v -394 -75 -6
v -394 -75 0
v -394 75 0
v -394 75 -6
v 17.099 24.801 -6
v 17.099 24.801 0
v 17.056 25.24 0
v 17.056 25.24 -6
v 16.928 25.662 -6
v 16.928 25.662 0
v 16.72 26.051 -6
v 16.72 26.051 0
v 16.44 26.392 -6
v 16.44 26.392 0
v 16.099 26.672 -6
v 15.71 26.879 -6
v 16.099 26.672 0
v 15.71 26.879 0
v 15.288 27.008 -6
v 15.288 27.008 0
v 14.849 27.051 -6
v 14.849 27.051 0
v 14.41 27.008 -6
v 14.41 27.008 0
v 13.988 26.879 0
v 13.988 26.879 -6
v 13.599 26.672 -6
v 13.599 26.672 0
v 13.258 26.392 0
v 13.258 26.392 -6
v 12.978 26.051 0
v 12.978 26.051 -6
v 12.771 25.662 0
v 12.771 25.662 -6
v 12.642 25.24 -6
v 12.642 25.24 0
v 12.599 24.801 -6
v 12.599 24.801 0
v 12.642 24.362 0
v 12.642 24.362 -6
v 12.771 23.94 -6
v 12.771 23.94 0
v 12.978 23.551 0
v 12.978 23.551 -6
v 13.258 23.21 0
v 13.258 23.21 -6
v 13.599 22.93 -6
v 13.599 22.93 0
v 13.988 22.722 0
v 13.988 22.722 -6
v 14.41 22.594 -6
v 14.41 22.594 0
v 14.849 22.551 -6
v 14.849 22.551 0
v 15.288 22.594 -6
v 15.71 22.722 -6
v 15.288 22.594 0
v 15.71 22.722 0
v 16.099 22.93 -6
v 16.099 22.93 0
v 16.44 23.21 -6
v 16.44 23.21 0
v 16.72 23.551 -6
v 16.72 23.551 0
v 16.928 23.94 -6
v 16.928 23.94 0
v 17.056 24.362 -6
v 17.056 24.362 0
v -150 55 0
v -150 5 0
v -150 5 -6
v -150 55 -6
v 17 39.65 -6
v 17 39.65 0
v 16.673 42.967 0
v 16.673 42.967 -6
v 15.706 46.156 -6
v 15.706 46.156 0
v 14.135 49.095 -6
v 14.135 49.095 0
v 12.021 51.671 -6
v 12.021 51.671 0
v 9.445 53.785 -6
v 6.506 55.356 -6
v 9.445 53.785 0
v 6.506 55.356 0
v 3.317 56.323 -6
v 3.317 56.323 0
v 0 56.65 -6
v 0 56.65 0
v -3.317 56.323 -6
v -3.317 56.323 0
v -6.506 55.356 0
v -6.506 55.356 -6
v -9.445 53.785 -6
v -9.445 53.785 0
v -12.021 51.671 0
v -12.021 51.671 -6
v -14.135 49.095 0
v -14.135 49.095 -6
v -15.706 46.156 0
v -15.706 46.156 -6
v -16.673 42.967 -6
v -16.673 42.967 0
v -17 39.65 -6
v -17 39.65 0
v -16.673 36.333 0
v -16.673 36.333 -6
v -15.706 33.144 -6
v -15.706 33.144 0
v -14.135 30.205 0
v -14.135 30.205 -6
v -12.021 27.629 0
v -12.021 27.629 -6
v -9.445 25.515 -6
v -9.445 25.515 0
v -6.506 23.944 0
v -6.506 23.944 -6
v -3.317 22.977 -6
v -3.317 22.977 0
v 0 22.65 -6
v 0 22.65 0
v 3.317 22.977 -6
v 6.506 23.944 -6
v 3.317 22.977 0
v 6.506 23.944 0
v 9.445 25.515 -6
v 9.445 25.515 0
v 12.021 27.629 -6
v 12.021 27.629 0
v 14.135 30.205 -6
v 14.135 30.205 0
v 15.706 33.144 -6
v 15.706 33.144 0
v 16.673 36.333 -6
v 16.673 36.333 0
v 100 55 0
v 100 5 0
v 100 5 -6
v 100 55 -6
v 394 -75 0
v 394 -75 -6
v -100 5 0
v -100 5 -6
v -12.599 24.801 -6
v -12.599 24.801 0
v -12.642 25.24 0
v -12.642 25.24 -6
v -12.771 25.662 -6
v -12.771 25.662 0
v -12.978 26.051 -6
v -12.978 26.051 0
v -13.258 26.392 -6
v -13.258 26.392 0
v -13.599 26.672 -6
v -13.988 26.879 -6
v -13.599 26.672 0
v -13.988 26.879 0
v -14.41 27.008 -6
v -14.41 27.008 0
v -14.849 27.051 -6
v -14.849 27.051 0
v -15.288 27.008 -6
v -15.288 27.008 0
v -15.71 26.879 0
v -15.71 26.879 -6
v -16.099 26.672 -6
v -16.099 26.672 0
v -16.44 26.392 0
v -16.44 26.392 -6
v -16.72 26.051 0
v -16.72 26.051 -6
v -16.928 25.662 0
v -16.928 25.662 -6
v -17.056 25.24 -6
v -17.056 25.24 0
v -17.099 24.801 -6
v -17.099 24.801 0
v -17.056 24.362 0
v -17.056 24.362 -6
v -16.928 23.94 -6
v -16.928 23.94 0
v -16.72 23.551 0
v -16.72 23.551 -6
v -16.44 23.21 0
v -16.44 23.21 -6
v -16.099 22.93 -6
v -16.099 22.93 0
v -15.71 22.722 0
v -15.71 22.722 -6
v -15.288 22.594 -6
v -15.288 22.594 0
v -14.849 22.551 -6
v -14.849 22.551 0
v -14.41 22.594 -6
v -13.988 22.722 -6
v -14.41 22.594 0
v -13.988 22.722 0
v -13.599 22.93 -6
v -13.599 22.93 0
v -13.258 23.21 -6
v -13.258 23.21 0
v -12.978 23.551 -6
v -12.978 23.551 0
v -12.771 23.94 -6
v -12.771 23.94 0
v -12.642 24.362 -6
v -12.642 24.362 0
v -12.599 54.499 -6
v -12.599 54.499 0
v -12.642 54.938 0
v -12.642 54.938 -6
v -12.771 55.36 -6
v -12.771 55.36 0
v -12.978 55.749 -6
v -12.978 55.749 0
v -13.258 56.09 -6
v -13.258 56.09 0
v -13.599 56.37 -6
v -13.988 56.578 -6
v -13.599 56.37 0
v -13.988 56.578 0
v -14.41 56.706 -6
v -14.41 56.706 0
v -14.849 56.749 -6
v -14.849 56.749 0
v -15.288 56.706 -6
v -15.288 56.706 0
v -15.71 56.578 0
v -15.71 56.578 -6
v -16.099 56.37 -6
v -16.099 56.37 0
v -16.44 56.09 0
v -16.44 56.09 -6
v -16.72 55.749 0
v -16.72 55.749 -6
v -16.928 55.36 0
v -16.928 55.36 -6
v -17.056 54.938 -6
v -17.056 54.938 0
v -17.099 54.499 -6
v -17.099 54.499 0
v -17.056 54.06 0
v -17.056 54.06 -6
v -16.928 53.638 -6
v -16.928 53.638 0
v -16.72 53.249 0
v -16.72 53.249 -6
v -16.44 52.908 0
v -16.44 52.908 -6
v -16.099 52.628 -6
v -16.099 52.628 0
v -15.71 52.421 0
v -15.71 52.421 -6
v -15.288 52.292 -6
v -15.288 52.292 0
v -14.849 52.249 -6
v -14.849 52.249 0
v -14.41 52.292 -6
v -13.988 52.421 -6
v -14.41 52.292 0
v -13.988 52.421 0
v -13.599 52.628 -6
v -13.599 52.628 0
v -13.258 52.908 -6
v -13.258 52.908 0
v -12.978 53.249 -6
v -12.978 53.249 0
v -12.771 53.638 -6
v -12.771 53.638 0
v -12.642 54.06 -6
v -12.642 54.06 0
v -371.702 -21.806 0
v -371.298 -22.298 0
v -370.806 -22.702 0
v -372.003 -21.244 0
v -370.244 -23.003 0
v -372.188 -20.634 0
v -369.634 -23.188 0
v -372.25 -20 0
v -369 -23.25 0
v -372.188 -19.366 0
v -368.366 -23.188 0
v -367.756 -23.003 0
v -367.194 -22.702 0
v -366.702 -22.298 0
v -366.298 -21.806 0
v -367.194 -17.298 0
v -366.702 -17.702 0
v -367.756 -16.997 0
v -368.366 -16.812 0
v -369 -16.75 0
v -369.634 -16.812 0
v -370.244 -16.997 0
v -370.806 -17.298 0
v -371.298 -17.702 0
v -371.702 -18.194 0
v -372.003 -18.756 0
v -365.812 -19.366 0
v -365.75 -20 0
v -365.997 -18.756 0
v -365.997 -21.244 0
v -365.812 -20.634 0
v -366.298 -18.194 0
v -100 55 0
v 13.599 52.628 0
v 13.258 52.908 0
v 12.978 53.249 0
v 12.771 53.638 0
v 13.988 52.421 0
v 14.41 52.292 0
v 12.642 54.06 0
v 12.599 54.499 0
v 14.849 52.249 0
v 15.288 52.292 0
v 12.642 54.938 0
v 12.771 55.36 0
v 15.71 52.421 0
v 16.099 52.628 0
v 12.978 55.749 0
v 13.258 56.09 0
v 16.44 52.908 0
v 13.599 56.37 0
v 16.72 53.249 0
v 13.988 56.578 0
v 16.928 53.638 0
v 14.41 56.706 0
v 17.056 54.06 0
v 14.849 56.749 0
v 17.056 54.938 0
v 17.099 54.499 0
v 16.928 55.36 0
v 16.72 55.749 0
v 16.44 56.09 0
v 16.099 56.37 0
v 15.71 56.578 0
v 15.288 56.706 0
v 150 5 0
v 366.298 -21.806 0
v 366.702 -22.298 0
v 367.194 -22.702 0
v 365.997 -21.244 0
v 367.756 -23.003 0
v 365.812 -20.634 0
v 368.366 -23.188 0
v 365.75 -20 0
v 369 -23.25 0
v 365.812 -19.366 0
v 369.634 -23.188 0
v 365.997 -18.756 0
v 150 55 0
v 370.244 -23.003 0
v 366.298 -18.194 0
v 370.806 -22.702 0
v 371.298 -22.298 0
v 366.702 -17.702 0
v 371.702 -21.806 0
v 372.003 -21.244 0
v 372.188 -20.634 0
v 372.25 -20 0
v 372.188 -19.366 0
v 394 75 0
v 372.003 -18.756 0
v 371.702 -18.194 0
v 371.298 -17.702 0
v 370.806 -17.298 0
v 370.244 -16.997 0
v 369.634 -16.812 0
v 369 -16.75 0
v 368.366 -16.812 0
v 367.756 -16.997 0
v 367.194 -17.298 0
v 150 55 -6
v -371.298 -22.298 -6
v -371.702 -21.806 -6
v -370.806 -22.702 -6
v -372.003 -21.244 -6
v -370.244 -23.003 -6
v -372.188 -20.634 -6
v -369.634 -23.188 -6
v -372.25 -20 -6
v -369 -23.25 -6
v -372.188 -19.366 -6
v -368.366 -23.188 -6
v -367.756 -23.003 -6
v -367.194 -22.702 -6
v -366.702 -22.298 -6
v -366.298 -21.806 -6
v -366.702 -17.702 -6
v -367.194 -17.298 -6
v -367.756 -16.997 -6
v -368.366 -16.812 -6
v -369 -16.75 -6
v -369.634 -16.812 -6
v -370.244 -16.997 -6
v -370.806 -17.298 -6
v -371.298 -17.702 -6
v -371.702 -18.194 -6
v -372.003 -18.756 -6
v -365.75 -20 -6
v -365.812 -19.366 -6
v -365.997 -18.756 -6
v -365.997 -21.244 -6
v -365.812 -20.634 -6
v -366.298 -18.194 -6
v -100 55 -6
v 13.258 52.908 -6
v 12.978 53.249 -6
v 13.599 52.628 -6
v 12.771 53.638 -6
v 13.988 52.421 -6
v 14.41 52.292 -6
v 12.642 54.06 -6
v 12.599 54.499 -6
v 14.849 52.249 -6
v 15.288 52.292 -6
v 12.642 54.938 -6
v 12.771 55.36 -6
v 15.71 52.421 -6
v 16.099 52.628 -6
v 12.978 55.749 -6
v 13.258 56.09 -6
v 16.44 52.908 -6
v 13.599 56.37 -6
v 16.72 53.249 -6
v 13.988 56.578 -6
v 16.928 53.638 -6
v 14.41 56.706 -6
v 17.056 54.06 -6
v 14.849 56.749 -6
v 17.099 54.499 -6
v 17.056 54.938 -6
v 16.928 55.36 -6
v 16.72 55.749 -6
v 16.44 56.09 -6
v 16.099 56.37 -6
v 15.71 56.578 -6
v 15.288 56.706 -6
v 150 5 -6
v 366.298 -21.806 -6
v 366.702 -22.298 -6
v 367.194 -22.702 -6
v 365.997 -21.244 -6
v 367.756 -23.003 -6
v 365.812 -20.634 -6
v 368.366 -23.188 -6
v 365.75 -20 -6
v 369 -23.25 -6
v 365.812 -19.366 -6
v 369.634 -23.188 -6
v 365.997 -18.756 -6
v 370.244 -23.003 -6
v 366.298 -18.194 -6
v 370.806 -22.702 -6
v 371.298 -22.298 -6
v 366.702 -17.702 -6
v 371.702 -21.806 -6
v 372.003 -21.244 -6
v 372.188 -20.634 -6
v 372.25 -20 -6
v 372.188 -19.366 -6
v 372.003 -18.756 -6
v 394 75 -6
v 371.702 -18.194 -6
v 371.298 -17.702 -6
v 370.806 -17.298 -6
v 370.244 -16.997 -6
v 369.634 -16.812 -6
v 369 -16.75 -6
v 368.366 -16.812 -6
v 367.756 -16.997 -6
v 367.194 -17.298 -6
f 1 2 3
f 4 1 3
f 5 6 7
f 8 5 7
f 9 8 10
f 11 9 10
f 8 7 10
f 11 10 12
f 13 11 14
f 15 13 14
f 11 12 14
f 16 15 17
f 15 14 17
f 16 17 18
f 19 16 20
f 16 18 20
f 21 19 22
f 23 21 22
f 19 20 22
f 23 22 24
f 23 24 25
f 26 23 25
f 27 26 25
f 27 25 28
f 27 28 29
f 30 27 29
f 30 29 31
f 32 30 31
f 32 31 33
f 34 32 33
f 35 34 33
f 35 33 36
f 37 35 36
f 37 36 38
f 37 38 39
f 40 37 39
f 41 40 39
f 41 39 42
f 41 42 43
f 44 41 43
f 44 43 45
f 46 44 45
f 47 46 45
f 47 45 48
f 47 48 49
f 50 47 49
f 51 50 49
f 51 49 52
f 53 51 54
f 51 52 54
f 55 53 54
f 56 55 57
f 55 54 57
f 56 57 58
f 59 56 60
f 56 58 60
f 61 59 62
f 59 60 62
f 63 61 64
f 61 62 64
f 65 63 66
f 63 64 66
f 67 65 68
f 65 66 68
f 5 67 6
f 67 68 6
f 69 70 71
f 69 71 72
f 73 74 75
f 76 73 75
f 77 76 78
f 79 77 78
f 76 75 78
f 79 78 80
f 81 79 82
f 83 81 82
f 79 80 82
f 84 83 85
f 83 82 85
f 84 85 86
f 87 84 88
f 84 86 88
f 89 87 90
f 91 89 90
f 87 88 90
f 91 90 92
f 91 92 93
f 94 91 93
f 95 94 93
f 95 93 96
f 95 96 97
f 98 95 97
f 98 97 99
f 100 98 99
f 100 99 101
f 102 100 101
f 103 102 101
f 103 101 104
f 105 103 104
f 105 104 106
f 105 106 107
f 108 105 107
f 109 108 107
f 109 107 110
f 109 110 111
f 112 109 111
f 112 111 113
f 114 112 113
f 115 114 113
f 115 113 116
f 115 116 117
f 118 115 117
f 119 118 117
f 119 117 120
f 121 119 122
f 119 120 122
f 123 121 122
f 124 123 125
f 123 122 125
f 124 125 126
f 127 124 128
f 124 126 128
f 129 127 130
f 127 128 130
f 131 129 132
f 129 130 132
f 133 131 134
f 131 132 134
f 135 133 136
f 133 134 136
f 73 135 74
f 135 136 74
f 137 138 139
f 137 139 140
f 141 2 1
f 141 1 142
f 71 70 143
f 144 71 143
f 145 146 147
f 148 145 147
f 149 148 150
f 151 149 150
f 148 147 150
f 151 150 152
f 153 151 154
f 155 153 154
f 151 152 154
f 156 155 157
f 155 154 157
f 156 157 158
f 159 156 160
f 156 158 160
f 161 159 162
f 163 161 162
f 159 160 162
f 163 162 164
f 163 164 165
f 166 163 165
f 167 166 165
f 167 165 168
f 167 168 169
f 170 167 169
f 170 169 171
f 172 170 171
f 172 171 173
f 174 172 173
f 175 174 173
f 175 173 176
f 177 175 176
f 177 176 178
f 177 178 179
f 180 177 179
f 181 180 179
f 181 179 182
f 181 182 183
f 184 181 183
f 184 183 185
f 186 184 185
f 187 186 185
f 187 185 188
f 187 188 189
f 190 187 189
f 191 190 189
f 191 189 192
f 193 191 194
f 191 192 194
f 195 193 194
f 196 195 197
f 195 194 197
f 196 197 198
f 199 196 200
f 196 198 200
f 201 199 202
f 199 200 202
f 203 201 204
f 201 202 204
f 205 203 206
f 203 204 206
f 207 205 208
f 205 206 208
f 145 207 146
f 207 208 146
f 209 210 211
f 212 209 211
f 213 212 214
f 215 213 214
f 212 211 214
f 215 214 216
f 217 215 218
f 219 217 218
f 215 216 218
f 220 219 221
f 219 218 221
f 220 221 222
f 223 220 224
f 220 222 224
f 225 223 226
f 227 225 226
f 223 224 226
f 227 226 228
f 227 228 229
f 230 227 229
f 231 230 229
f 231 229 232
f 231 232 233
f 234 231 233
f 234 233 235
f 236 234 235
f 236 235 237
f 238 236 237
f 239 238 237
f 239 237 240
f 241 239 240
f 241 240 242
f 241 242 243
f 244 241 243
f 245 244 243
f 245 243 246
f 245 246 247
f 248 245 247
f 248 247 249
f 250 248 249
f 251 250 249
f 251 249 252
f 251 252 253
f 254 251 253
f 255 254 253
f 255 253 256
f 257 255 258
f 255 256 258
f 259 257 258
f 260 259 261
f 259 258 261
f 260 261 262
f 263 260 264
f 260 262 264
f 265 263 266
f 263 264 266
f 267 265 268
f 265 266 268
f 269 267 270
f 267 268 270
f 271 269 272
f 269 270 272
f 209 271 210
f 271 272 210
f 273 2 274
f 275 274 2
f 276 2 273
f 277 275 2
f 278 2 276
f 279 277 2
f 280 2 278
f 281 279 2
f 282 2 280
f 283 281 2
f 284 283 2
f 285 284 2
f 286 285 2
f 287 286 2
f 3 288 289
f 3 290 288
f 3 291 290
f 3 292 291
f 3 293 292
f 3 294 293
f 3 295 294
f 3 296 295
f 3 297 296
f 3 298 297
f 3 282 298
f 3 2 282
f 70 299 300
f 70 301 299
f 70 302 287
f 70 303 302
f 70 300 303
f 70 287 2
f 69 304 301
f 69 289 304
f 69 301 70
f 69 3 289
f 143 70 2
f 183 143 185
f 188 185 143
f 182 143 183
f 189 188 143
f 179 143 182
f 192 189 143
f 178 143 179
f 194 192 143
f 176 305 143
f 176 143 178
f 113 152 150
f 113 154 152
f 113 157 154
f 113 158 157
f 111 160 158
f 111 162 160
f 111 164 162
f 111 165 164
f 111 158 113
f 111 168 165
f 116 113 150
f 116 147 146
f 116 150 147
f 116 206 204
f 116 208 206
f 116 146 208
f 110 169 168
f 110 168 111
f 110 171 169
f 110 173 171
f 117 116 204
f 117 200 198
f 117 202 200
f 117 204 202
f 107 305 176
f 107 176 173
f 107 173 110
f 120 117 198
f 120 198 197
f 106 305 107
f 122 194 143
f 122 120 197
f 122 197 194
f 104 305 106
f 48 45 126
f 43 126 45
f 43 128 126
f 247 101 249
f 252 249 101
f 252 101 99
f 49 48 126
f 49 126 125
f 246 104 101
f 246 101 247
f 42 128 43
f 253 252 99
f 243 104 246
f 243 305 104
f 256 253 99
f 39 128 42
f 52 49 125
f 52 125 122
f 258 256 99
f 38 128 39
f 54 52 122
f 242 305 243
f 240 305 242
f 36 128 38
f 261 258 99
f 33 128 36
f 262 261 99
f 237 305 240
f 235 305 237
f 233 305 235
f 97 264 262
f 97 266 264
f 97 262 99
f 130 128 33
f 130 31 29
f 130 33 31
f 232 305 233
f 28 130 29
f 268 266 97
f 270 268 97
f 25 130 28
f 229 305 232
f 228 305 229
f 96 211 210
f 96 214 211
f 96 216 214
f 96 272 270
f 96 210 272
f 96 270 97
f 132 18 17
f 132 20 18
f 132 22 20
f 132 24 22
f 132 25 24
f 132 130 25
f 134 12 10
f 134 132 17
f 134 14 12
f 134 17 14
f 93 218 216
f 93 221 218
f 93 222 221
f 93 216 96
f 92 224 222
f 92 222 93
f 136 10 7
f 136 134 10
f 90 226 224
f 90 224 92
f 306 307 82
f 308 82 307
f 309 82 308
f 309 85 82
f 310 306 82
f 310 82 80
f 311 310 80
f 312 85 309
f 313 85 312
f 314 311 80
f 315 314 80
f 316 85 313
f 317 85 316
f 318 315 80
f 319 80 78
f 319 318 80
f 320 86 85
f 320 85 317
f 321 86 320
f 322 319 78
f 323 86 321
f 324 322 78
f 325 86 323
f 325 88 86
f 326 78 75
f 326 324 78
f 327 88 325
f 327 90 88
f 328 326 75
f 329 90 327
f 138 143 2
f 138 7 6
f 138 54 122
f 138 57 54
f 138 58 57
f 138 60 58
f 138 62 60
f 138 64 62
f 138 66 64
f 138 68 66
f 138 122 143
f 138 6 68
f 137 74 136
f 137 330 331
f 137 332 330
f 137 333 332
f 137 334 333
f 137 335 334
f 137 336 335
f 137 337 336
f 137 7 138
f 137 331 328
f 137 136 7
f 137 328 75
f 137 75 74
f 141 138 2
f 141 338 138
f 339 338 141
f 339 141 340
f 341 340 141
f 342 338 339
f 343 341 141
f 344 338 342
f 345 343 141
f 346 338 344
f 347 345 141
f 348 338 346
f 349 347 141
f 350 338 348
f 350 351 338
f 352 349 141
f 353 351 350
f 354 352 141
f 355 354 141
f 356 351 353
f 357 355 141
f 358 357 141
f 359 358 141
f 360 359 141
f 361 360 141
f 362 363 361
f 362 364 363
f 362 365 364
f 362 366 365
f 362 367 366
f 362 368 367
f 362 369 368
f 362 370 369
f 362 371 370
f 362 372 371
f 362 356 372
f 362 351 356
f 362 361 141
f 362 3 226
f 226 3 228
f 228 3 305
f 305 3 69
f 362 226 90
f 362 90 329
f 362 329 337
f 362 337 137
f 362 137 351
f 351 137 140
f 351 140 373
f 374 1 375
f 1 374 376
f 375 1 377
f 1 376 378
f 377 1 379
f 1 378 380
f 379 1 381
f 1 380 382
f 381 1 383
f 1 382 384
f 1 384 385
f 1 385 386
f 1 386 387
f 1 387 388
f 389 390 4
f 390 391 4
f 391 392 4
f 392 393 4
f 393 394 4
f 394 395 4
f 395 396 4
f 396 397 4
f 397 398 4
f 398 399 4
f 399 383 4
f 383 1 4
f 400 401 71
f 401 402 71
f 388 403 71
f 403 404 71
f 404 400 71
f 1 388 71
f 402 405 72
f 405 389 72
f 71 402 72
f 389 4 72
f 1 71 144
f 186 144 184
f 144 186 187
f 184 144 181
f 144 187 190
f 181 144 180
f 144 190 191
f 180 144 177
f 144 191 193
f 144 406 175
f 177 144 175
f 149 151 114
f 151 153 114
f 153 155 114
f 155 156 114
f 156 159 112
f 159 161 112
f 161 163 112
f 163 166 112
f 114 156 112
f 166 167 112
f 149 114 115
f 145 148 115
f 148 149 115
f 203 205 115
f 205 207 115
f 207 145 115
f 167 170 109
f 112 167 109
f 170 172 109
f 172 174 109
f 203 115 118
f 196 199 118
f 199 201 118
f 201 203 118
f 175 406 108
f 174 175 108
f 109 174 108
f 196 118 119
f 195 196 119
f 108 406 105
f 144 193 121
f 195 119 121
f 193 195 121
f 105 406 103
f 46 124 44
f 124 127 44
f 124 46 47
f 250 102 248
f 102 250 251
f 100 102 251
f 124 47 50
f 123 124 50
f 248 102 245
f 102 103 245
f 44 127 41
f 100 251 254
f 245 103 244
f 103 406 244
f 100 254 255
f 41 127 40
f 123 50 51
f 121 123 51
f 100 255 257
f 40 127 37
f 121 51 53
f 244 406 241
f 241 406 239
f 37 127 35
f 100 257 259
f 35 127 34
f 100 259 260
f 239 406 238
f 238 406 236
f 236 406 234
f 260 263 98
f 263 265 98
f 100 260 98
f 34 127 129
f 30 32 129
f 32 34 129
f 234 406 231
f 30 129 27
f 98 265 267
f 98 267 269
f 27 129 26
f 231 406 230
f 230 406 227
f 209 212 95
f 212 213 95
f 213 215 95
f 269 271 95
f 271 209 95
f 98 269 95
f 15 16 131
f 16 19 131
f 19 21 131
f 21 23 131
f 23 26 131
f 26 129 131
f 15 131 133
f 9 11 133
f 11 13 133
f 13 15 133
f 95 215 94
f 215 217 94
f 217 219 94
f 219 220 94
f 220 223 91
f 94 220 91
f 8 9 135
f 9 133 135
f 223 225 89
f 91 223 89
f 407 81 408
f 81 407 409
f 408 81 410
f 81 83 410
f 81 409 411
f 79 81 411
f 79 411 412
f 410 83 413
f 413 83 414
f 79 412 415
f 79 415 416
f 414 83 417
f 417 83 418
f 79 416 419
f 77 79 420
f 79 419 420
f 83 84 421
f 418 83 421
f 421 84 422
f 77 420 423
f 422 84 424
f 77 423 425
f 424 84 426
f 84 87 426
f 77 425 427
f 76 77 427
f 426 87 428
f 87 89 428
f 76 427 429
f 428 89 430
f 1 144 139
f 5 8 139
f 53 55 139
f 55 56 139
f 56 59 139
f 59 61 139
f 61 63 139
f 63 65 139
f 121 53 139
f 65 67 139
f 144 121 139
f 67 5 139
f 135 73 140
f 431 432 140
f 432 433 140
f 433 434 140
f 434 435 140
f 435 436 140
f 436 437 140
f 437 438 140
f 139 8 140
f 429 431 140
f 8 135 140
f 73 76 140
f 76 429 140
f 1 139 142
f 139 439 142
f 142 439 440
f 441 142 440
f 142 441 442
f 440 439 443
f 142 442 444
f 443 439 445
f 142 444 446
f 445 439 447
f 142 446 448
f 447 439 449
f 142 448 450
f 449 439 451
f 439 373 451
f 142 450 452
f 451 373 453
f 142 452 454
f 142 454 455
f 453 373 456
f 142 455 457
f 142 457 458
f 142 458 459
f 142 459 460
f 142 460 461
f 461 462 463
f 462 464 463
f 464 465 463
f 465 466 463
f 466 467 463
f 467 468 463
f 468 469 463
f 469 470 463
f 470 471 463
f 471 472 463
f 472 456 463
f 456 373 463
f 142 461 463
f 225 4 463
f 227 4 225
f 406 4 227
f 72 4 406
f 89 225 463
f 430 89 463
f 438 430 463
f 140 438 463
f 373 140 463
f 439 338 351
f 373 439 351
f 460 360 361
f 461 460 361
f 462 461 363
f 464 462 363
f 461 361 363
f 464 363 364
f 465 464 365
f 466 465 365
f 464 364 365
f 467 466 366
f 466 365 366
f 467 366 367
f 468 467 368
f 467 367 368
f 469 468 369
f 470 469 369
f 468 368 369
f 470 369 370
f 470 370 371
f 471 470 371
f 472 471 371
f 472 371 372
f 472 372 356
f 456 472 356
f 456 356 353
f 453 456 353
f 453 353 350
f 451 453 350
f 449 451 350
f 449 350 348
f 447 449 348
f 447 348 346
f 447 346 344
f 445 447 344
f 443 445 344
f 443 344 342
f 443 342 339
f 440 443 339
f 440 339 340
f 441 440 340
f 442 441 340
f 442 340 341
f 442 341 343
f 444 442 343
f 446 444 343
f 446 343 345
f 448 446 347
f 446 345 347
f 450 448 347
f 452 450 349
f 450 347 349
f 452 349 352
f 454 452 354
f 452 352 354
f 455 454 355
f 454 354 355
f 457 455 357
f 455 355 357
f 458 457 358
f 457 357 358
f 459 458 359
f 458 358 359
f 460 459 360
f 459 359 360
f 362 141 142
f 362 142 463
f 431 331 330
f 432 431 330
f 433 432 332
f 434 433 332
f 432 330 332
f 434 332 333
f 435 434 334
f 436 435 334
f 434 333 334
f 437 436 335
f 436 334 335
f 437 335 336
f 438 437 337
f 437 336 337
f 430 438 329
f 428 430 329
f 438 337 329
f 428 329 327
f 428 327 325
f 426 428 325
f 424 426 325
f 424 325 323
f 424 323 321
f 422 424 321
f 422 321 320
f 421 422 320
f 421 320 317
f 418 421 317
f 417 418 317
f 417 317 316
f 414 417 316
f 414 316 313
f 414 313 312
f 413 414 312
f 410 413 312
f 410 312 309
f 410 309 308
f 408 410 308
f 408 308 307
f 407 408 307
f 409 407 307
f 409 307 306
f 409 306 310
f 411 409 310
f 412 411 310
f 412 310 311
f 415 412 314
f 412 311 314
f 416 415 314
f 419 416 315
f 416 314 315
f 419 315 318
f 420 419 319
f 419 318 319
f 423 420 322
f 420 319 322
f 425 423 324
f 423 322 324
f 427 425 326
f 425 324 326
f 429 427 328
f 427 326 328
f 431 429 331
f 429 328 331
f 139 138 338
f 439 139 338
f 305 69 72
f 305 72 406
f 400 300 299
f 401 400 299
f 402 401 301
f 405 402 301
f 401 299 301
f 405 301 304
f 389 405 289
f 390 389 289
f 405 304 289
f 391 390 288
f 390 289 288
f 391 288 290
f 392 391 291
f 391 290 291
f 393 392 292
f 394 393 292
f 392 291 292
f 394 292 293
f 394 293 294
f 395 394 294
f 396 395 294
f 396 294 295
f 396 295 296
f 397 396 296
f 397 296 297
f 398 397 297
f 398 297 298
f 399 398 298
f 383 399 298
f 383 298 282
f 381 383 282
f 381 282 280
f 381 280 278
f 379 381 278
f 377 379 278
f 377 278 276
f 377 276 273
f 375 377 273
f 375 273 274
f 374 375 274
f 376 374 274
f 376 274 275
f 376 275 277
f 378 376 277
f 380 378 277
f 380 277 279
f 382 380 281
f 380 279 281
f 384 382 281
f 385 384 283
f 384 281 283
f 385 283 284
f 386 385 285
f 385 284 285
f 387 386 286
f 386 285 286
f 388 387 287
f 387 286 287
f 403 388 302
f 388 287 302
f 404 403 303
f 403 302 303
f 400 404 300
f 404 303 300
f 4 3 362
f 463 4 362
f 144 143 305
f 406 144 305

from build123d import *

# Parameters (mm, degrees)
SKETCH1_W          = 788
SKETCH1_H          = 150
BASE_FLANGE1_DEPTH = 6
SKETCH2_R          = 2.25
SKETCH2_R_2        = 17
SKETCH2_W          = 50
SKETCH2_H          = 50
CUT_EXTRUDE1_DEPTH = 402.119682888
SKETCH3_R          = 3.25
CUT_EXTRUDE2_DEPTH = 10


# Sheet-metal steps are written as plain solids
with BuildPart() as part:
    # Sketch1 → Base-Flange1 (new body)
    with BuildSketch(Plane.XY):
        Rectangle(SKETCH1_W, SKETCH1_H)
    extrude(amount=-BASE_FLANGE1_DEPTH)

    # Sketch2 → Cut-Extrude1 (cut, through all)
    with BuildSketch(Plane.XY):
        with Locations((14.849242405, 54.499242405)):
            Circle(SKETCH2_R)
        with Locations((-14.849242405, 54.499242405)):
            Circle(SKETCH2_R)
        with Locations((-14.849242405, 24.800757595)):
            Circle(SKETCH2_R)
        with Locations((14.849242405, 24.800757595)):
            Circle(SKETCH2_R)
        with Locations((0, 39.65)):
            Circle(SKETCH2_R_2)
        with Locations((-125, 30)):
            Rectangle(SKETCH2_W, SKETCH2_H)
        with Locations((125, 30)):
            Rectangle(SKETCH2_W, SKETCH2_H)
    extrude(amount=-CUT_EXTRUDE1_DEPTH, mode=Mode.SUBTRACT)

    # Sketch3 → Cut-Extrude2 (cut)
    with BuildSketch(Plane.XY):
        with Locations((369, -20)):
            Circle(SKETCH3_R)
        with Locations((-369, -20)):
            Circle(SKETCH3_R)
    extrude(amount=-CUT_EXTRUDE2_DEPTH, mode=Mode.SUBTRACT)


solid = part.part
